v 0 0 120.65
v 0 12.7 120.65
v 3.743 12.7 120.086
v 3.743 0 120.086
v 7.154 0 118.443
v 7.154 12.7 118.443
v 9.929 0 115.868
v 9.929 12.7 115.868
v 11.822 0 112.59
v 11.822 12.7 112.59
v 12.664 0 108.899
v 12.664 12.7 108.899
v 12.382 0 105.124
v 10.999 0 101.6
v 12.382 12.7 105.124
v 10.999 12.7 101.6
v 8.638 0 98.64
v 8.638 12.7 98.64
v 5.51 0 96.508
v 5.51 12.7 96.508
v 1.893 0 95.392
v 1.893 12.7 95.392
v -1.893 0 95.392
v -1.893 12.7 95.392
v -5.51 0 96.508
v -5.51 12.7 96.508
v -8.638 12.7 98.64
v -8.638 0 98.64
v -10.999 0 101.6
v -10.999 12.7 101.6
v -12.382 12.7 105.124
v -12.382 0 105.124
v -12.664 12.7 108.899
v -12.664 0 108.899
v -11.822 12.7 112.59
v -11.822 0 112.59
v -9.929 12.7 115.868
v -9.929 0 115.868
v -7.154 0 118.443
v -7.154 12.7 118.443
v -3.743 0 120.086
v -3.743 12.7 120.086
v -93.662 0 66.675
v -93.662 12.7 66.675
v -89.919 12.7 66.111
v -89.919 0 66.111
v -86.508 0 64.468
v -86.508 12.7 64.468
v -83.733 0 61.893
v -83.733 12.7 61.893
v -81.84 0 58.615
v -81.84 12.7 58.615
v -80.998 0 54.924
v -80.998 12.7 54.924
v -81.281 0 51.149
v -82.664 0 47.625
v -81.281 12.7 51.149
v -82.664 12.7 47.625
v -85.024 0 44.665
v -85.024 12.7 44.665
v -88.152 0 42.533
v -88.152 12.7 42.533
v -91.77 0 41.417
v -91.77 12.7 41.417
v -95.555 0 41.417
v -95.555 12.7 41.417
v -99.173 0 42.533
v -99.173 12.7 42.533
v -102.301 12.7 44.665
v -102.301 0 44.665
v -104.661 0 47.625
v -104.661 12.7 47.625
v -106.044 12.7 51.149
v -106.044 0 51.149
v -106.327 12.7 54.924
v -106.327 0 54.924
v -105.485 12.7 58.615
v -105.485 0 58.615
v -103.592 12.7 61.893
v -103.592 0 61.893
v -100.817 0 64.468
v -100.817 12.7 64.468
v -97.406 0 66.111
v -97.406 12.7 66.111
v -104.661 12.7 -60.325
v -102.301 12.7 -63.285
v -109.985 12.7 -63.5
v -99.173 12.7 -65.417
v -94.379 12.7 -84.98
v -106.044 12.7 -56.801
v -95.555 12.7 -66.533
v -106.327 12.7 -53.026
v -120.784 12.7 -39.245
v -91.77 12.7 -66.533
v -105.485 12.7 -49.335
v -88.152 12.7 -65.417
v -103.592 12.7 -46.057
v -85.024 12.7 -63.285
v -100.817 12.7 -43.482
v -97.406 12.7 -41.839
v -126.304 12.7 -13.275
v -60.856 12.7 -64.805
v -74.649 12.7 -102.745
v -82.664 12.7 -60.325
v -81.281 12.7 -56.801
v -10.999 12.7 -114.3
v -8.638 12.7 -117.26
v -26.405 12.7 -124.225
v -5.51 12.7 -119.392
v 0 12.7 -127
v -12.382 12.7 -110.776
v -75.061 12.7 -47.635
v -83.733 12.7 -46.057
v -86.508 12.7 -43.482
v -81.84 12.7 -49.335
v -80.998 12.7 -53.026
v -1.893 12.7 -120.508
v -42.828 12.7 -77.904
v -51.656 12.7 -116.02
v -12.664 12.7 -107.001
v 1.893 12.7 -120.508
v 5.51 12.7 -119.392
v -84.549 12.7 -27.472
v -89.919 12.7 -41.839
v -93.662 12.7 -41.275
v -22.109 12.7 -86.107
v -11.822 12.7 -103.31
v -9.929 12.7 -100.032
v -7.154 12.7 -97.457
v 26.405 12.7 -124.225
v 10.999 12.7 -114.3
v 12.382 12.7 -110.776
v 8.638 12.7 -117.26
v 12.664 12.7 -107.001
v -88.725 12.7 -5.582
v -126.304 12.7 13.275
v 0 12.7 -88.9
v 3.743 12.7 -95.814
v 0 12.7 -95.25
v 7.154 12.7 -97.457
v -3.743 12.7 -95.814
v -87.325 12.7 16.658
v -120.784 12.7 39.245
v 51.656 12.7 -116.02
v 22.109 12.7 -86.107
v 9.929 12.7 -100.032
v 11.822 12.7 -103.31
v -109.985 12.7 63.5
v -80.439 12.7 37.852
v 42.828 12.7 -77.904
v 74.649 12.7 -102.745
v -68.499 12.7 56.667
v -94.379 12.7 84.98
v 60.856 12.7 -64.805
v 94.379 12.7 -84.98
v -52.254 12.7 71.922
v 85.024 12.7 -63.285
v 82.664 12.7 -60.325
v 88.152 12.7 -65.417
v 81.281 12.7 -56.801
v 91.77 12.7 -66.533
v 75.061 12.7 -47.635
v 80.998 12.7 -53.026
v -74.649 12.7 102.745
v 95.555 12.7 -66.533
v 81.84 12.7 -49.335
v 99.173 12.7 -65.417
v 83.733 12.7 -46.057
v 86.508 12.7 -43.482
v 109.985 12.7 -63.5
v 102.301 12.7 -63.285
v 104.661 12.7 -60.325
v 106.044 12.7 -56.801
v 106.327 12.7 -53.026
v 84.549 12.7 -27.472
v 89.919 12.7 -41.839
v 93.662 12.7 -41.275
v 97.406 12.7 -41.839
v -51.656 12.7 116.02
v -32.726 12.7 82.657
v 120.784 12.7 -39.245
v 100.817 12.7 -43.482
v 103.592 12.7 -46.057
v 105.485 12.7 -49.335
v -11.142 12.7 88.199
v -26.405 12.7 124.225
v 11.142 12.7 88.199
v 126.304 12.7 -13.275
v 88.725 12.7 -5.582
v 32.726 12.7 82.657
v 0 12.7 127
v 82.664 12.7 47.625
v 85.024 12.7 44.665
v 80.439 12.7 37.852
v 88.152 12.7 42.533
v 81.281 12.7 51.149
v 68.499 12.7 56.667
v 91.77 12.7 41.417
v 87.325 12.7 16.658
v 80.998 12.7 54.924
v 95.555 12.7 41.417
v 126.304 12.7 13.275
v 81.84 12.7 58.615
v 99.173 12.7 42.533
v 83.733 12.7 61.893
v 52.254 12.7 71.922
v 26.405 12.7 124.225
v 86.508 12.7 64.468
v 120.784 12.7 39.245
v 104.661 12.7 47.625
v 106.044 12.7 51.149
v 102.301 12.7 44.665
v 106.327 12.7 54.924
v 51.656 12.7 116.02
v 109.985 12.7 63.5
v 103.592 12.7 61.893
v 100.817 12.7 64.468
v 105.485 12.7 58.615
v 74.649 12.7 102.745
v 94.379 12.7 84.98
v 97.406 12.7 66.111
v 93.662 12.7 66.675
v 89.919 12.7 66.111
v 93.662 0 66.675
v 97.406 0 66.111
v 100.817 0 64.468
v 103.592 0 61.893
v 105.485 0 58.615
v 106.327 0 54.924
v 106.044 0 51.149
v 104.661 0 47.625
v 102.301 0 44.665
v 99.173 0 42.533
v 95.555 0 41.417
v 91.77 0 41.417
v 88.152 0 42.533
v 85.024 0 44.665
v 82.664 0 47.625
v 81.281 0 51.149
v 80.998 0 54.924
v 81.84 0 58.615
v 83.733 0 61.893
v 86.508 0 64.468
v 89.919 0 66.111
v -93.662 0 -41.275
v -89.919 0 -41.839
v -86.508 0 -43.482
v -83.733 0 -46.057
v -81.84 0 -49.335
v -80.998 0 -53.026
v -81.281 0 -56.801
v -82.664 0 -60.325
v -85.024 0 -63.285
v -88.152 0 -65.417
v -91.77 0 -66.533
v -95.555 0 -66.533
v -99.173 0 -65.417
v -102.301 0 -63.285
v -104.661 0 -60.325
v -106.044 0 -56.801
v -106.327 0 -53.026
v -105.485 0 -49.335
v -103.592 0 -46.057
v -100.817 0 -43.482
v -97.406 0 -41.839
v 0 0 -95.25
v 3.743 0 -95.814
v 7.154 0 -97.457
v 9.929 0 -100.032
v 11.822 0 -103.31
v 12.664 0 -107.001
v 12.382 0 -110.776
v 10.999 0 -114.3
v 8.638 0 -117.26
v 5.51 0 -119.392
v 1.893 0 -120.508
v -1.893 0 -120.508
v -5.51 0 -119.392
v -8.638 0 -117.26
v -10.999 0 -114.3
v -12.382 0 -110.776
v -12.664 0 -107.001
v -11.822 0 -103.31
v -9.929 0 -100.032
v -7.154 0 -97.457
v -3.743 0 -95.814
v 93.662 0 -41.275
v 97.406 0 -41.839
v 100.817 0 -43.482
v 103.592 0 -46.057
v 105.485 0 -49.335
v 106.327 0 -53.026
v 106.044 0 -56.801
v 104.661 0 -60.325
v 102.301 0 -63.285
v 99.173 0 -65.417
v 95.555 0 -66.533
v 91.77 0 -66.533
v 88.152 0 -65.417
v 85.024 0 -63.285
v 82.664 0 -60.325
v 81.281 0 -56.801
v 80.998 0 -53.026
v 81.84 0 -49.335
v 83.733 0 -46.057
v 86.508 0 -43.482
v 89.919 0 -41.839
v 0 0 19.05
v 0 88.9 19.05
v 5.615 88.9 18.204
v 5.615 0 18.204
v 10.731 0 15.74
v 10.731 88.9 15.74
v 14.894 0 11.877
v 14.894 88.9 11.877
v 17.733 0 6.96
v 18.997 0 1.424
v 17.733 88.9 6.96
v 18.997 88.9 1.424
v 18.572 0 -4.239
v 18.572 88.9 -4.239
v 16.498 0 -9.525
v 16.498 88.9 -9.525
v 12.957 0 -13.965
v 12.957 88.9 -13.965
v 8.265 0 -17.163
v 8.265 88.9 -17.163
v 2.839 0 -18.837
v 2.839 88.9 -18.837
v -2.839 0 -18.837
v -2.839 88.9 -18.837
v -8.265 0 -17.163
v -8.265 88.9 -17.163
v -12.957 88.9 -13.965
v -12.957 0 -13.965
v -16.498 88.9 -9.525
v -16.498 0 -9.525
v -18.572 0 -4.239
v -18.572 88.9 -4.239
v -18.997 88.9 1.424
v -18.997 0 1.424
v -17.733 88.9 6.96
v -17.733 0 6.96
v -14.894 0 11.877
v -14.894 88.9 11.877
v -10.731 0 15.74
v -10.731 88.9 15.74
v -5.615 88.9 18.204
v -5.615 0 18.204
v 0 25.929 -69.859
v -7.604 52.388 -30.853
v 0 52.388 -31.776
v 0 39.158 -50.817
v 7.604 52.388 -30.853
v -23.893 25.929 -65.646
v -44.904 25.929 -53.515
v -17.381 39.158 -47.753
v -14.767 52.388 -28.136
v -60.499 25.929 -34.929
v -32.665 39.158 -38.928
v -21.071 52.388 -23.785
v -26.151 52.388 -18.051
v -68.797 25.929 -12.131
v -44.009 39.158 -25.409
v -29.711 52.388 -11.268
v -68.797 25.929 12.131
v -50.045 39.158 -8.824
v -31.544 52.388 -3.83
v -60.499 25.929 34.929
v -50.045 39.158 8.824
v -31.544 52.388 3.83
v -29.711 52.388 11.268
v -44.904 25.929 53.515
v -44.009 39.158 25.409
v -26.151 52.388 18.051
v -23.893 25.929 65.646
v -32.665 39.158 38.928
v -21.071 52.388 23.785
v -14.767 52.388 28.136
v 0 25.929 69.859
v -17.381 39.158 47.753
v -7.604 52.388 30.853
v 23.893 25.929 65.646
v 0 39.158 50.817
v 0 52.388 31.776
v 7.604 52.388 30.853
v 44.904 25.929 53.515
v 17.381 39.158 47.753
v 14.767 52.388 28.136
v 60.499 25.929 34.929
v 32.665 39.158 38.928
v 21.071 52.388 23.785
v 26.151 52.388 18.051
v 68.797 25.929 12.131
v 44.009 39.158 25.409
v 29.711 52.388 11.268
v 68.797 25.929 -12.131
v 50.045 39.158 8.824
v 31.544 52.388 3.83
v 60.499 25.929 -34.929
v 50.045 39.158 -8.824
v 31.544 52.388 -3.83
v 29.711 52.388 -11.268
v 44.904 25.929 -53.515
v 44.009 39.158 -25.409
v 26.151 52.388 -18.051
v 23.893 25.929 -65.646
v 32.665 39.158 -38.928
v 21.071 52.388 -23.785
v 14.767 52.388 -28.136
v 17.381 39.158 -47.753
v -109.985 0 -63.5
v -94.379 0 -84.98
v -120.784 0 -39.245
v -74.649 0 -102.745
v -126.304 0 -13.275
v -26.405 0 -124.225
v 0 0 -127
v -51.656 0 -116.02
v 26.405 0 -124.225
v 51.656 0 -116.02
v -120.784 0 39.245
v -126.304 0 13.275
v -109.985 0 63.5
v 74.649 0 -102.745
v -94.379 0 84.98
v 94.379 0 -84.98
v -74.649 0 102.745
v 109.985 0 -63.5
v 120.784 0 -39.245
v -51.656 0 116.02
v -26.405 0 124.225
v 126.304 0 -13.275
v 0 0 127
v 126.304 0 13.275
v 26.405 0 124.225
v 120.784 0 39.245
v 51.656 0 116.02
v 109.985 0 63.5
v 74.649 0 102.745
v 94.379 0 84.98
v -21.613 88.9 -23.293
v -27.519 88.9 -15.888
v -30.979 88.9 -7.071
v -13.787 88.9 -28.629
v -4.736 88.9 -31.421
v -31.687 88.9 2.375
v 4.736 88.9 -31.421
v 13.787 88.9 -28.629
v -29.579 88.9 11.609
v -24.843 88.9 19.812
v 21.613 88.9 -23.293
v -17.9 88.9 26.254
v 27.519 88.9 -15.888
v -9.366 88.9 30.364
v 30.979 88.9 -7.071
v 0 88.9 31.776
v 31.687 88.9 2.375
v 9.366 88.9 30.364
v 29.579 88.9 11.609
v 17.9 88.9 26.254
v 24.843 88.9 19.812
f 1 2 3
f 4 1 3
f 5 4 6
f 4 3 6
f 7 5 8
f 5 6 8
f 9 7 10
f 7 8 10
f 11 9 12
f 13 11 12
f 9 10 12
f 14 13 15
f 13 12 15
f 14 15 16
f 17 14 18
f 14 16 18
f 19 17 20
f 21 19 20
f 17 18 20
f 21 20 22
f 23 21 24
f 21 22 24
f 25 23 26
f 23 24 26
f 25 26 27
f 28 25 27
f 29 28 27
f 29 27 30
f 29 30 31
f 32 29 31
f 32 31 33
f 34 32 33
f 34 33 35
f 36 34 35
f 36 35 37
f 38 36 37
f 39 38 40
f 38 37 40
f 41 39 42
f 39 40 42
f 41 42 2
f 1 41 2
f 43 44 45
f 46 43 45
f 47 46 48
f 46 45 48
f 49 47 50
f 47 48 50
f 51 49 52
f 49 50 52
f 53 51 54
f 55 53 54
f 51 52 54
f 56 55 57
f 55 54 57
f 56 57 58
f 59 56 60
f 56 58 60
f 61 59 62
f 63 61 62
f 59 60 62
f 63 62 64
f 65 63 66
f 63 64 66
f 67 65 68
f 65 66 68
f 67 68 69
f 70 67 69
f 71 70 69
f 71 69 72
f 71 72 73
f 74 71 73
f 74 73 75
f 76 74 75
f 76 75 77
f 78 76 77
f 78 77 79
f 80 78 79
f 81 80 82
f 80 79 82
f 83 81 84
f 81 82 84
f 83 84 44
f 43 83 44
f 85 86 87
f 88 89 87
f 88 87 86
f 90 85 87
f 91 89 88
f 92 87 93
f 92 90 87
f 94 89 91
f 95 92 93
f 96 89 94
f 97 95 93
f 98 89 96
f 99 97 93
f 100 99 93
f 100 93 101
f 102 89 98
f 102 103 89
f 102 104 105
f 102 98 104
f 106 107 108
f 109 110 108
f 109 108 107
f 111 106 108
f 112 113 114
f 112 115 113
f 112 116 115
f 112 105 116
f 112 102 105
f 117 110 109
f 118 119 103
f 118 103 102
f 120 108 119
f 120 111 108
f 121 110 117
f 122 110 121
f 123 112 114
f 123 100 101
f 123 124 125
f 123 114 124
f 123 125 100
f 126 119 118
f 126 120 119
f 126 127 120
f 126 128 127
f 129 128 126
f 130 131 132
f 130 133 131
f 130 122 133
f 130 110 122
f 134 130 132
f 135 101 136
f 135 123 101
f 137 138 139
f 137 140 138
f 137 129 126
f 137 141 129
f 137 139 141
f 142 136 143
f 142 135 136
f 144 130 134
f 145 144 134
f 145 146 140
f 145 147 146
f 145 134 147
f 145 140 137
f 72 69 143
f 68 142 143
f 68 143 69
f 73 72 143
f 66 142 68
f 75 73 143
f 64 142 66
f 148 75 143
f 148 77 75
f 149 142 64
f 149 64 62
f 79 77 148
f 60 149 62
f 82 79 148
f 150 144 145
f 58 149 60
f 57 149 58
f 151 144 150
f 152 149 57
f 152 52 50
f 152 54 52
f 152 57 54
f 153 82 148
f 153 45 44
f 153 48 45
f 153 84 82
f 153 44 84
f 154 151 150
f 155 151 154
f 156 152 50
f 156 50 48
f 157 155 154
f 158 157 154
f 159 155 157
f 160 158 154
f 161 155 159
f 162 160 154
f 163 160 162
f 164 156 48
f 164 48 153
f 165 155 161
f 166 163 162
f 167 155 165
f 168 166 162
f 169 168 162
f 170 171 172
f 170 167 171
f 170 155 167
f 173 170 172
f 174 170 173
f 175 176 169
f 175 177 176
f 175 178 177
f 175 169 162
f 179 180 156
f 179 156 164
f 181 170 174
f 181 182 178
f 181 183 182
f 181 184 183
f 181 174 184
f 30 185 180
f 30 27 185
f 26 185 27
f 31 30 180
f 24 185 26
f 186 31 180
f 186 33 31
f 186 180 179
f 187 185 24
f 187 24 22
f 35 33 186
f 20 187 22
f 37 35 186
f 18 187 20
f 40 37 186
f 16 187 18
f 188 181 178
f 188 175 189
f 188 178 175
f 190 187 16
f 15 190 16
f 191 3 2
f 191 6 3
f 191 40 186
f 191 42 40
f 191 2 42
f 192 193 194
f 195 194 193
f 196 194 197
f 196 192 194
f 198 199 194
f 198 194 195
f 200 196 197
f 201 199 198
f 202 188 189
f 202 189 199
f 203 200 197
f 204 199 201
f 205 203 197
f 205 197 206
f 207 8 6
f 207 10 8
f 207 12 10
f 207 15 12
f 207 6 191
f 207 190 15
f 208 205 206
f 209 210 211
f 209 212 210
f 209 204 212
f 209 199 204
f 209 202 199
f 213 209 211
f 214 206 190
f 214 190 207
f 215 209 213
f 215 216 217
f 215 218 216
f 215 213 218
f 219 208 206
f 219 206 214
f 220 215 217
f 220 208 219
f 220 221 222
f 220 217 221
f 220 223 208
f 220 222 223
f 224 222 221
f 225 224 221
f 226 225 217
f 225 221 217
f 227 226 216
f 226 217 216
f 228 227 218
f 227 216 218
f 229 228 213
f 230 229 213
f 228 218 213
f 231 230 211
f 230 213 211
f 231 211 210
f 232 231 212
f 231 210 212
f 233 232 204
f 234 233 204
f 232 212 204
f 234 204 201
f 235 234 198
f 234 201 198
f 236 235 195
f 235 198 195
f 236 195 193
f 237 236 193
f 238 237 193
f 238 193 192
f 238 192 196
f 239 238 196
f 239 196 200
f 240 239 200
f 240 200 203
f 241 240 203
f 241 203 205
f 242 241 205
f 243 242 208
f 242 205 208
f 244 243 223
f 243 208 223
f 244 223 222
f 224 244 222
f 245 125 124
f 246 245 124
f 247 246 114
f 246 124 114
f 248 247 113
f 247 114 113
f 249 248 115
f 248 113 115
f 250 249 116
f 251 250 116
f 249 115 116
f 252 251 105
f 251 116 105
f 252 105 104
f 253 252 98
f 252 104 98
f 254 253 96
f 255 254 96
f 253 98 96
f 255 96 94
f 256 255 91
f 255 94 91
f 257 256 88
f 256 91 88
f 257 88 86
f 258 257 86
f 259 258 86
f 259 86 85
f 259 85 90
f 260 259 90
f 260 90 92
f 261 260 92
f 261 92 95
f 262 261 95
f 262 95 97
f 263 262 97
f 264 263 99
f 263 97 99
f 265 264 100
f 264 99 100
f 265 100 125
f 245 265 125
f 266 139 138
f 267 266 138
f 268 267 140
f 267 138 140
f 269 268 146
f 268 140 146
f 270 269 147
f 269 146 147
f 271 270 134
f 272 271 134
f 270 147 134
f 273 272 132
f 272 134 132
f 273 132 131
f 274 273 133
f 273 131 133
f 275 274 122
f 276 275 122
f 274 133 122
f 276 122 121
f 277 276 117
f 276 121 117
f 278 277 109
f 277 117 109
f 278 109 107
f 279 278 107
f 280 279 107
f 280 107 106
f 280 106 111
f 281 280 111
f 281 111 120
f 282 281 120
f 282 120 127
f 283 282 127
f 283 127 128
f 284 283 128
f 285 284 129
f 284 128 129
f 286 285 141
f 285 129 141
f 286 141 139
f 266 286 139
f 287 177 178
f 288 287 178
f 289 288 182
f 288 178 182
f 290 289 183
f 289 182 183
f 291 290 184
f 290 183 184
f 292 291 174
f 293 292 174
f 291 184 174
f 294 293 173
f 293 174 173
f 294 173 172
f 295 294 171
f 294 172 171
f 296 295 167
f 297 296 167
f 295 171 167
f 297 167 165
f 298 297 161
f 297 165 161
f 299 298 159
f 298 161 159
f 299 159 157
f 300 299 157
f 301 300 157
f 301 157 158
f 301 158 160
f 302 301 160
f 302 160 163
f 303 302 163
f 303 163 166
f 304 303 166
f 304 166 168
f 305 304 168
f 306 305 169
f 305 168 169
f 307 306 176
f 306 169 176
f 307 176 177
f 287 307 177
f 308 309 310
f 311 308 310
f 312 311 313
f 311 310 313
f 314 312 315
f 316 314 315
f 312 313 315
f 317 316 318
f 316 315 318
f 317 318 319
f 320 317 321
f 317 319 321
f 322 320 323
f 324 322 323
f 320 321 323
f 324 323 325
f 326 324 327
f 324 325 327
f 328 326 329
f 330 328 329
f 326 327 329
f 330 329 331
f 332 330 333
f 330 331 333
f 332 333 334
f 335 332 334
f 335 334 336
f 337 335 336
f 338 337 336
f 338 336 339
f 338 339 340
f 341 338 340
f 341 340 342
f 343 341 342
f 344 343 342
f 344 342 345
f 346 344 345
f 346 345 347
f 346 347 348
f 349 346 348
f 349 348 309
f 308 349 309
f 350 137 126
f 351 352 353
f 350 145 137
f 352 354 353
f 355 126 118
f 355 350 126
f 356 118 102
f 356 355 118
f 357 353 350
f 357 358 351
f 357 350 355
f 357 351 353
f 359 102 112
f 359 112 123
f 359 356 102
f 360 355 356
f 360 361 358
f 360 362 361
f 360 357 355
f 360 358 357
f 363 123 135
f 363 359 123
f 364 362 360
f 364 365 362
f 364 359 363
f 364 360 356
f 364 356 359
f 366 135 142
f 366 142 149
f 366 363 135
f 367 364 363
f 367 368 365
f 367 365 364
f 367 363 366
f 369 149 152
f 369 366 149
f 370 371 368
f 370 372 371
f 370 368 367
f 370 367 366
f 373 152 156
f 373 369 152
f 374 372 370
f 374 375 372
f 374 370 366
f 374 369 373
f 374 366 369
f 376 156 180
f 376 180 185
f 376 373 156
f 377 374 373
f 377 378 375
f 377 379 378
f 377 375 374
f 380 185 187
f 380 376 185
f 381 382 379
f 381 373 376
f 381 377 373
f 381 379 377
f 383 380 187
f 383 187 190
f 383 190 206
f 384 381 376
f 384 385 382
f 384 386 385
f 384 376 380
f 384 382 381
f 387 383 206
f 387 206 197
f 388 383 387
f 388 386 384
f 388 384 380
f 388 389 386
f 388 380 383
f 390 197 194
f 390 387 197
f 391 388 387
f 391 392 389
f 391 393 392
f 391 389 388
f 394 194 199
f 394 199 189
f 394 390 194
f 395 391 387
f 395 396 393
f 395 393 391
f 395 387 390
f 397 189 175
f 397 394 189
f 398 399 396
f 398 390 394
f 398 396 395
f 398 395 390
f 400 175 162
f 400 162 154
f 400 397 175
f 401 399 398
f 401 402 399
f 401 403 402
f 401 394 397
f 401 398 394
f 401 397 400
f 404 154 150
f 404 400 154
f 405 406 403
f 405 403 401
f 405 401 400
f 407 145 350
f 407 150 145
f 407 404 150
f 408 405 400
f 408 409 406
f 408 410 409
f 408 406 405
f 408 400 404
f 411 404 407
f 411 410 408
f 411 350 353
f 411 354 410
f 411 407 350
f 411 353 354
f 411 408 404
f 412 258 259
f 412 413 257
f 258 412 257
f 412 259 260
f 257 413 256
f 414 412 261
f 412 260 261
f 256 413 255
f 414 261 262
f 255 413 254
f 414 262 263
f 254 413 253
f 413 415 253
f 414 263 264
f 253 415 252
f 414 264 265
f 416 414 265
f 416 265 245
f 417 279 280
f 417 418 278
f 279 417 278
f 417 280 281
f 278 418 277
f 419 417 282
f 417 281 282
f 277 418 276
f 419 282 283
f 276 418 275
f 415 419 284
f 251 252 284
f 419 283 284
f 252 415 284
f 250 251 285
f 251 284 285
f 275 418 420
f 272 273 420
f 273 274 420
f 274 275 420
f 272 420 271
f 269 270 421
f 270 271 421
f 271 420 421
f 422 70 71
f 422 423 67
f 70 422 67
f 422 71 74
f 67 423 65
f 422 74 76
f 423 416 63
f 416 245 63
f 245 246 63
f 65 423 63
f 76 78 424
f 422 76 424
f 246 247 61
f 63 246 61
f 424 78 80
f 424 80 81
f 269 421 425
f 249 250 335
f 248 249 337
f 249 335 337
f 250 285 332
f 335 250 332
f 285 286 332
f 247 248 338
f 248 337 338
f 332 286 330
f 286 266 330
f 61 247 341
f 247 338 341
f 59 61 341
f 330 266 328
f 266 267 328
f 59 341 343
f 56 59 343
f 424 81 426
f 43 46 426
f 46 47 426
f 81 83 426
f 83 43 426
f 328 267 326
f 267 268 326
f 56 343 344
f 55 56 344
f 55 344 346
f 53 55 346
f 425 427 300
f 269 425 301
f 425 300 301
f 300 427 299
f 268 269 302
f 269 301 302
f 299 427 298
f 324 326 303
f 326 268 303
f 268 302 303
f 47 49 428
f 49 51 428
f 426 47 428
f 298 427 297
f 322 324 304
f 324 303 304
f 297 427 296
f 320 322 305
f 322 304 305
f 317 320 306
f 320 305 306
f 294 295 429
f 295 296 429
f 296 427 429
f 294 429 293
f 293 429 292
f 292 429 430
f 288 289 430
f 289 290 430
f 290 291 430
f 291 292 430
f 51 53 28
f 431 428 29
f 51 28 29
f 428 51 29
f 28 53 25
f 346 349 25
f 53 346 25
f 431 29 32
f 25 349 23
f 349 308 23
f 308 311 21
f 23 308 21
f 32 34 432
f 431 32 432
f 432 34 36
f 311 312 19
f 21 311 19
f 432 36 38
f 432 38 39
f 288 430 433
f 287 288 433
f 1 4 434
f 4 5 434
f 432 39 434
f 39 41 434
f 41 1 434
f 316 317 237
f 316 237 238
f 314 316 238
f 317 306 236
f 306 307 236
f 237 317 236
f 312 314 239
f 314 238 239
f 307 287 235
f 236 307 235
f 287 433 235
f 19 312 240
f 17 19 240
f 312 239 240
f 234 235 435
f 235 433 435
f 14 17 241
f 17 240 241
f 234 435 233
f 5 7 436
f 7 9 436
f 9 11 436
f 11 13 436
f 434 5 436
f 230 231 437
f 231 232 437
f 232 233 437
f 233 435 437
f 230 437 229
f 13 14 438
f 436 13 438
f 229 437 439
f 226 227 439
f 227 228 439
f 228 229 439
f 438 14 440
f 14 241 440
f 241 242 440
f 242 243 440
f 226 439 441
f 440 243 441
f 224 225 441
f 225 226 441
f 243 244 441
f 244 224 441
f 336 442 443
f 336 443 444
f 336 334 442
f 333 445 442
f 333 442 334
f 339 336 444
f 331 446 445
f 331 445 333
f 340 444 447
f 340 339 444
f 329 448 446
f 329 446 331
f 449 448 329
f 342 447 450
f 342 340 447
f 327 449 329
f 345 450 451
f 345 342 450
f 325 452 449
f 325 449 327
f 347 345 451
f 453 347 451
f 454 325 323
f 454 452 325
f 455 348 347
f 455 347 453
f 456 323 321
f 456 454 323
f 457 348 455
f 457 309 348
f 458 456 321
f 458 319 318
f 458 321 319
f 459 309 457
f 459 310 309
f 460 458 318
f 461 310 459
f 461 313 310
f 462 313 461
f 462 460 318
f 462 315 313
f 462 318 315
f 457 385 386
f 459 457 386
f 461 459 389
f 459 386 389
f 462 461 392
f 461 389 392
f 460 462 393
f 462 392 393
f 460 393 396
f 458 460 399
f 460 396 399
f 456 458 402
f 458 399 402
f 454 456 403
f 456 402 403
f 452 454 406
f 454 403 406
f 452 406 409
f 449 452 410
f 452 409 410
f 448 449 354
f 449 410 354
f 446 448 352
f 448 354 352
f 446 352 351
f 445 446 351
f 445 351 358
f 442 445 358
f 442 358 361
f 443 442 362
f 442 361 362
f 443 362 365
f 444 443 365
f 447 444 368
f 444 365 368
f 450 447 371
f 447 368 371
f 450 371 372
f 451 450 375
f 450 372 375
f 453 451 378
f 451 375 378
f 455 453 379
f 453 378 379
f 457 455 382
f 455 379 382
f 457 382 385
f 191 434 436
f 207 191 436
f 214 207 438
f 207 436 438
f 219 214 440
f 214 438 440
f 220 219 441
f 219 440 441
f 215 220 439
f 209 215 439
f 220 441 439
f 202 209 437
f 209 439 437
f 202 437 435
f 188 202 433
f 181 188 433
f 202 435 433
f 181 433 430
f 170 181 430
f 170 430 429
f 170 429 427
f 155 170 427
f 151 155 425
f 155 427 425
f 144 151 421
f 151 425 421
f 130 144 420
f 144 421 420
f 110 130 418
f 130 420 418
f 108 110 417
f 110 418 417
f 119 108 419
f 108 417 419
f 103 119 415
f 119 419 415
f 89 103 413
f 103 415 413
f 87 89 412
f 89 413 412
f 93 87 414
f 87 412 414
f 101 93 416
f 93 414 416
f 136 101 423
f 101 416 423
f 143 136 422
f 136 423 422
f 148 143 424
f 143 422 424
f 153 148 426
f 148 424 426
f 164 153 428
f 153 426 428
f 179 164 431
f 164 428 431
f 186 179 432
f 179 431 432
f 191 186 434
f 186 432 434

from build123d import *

# Parameters (mm, degrees)
SKETCH1_R           = 127
BOSS_EXTRUDE1_DEPTH = 12.7
SKETCH2_R           = 12.7
CUT_EXTRUDE2_DEPTH  = 12.7
SKETCH4_R           = 88.9
BOSS_EXTRUDE2_DEPTH = 39.6875
CHAMFER2_SIZE2      = 57.124100733
CHAMFER2_SIZE       = 39.6875
SKETCH6_R           = 31.775899267
BOSS_EXTRUDE3_DEPTH = 36.5125
SKETCH7_R           = 19.05
CUT_EXTRUDE3_DEPTH  = 155.3845


with BuildPart() as part:
    # Sketch1 → Boss-Extrude1 (new body)
    with BuildSketch(Plane(origin=(0, 0, 0), x_dir=(1, 0, 0), z_dir=(0, 1, 0))):
        with Locations(Location((0, 0, 0), (0, 0, 270))):
            Circle(SKETCH1_R)
    extrude(amount=BOSS_EXTRUDE1_DEPTH)

    # Sketch2 → Cut-Extrude2 (cut)
    with BuildSketch(Plane(origin=(0, 12.7, 0), x_dir=(1, 0, 0), z_dir=(0, 1, 0))):
        with Locations(Location((0, 107.95, 0), (0, 0, 270))):
            Circle(SKETCH2_R)
        with Locations(Location((0, -107.95, 0), (0, 0, 270))):
            Circle(SKETCH2_R)
        with Locations(Location((-93.6625, 53.975, 0), (0, 0, 270))):
            Circle(SKETCH2_R)
        with Locations(Location((93.6625, 53.975, 0), (0, 0, 270))):
            Circle(SKETCH2_R)
        with Locations(Location((-93.6625, -53.975, 0), (0, 0, 270))):
            Circle(SKETCH2_R)
        with Locations(Location((93.6625, -53.975, 0), (0, 0, 270))):
            Circle(SKETCH2_R)
    extrude(amount=-CUT_EXTRUDE2_DEPTH, mode=Mode.SUBTRACT)

    # Sketch4 → Boss-Extrude2 (add)
    with BuildSketch(Plane(origin=(0, 12.7, 0), x_dir=(1, 0, 0), z_dir=(0, 1, 0))):
        with Locations(Location((0, 0, 0), (0, 0, 90))):
            Circle(SKETCH4_R)
    extrude(amount=BOSS_EXTRUDE2_DEPTH)

    # Chamfer2
    chamfer2_edges = [part.edges().sort_by_distance(p)[0] for p in [
        (0, 52.3875, 88.9),
    ]]
    chamfer2_side = [part.faces().sort_by_distance(p)[0] for p in [
        (0, 51.59375, 88.9),
    ]]
    chamfer(chamfer2_edges, length=CHAMFER2_SIZE - 0.0001, length2=CHAMFER2_SIZE2 - 0.0001, reference=chamfer2_side[0])  # a hair under: the kernel refuses the full size

    # Sketch6 → Boss-Extrude3 (add)
    with BuildSketch(Plane(origin=(0, 52.3875, 0), x_dir=(1, 0, 0), z_dir=(0, 1, 0))):
        with Locations(Location((0, 0, 0), (0, 0, 270))):
            Circle(SKETCH6_R)
    extrude(amount=BOSS_EXTRUDE3_DEPTH)

    # Sketch7 → Cut-Extrude3 (cut)
    with BuildSketch(Plane(origin=(0, 88.9, 0), x_dir=(1, 0, 0), z_dir=(0, 1, 0))):
        with Locations(Location((0, 0, 0), (0, 0, 270))):
            Circle(SKETCH7_R)
    extrude(amount=-CUT_EXTRUDE3_DEPTH, mode=Mode.SUBTRACT)


solid = part.part
